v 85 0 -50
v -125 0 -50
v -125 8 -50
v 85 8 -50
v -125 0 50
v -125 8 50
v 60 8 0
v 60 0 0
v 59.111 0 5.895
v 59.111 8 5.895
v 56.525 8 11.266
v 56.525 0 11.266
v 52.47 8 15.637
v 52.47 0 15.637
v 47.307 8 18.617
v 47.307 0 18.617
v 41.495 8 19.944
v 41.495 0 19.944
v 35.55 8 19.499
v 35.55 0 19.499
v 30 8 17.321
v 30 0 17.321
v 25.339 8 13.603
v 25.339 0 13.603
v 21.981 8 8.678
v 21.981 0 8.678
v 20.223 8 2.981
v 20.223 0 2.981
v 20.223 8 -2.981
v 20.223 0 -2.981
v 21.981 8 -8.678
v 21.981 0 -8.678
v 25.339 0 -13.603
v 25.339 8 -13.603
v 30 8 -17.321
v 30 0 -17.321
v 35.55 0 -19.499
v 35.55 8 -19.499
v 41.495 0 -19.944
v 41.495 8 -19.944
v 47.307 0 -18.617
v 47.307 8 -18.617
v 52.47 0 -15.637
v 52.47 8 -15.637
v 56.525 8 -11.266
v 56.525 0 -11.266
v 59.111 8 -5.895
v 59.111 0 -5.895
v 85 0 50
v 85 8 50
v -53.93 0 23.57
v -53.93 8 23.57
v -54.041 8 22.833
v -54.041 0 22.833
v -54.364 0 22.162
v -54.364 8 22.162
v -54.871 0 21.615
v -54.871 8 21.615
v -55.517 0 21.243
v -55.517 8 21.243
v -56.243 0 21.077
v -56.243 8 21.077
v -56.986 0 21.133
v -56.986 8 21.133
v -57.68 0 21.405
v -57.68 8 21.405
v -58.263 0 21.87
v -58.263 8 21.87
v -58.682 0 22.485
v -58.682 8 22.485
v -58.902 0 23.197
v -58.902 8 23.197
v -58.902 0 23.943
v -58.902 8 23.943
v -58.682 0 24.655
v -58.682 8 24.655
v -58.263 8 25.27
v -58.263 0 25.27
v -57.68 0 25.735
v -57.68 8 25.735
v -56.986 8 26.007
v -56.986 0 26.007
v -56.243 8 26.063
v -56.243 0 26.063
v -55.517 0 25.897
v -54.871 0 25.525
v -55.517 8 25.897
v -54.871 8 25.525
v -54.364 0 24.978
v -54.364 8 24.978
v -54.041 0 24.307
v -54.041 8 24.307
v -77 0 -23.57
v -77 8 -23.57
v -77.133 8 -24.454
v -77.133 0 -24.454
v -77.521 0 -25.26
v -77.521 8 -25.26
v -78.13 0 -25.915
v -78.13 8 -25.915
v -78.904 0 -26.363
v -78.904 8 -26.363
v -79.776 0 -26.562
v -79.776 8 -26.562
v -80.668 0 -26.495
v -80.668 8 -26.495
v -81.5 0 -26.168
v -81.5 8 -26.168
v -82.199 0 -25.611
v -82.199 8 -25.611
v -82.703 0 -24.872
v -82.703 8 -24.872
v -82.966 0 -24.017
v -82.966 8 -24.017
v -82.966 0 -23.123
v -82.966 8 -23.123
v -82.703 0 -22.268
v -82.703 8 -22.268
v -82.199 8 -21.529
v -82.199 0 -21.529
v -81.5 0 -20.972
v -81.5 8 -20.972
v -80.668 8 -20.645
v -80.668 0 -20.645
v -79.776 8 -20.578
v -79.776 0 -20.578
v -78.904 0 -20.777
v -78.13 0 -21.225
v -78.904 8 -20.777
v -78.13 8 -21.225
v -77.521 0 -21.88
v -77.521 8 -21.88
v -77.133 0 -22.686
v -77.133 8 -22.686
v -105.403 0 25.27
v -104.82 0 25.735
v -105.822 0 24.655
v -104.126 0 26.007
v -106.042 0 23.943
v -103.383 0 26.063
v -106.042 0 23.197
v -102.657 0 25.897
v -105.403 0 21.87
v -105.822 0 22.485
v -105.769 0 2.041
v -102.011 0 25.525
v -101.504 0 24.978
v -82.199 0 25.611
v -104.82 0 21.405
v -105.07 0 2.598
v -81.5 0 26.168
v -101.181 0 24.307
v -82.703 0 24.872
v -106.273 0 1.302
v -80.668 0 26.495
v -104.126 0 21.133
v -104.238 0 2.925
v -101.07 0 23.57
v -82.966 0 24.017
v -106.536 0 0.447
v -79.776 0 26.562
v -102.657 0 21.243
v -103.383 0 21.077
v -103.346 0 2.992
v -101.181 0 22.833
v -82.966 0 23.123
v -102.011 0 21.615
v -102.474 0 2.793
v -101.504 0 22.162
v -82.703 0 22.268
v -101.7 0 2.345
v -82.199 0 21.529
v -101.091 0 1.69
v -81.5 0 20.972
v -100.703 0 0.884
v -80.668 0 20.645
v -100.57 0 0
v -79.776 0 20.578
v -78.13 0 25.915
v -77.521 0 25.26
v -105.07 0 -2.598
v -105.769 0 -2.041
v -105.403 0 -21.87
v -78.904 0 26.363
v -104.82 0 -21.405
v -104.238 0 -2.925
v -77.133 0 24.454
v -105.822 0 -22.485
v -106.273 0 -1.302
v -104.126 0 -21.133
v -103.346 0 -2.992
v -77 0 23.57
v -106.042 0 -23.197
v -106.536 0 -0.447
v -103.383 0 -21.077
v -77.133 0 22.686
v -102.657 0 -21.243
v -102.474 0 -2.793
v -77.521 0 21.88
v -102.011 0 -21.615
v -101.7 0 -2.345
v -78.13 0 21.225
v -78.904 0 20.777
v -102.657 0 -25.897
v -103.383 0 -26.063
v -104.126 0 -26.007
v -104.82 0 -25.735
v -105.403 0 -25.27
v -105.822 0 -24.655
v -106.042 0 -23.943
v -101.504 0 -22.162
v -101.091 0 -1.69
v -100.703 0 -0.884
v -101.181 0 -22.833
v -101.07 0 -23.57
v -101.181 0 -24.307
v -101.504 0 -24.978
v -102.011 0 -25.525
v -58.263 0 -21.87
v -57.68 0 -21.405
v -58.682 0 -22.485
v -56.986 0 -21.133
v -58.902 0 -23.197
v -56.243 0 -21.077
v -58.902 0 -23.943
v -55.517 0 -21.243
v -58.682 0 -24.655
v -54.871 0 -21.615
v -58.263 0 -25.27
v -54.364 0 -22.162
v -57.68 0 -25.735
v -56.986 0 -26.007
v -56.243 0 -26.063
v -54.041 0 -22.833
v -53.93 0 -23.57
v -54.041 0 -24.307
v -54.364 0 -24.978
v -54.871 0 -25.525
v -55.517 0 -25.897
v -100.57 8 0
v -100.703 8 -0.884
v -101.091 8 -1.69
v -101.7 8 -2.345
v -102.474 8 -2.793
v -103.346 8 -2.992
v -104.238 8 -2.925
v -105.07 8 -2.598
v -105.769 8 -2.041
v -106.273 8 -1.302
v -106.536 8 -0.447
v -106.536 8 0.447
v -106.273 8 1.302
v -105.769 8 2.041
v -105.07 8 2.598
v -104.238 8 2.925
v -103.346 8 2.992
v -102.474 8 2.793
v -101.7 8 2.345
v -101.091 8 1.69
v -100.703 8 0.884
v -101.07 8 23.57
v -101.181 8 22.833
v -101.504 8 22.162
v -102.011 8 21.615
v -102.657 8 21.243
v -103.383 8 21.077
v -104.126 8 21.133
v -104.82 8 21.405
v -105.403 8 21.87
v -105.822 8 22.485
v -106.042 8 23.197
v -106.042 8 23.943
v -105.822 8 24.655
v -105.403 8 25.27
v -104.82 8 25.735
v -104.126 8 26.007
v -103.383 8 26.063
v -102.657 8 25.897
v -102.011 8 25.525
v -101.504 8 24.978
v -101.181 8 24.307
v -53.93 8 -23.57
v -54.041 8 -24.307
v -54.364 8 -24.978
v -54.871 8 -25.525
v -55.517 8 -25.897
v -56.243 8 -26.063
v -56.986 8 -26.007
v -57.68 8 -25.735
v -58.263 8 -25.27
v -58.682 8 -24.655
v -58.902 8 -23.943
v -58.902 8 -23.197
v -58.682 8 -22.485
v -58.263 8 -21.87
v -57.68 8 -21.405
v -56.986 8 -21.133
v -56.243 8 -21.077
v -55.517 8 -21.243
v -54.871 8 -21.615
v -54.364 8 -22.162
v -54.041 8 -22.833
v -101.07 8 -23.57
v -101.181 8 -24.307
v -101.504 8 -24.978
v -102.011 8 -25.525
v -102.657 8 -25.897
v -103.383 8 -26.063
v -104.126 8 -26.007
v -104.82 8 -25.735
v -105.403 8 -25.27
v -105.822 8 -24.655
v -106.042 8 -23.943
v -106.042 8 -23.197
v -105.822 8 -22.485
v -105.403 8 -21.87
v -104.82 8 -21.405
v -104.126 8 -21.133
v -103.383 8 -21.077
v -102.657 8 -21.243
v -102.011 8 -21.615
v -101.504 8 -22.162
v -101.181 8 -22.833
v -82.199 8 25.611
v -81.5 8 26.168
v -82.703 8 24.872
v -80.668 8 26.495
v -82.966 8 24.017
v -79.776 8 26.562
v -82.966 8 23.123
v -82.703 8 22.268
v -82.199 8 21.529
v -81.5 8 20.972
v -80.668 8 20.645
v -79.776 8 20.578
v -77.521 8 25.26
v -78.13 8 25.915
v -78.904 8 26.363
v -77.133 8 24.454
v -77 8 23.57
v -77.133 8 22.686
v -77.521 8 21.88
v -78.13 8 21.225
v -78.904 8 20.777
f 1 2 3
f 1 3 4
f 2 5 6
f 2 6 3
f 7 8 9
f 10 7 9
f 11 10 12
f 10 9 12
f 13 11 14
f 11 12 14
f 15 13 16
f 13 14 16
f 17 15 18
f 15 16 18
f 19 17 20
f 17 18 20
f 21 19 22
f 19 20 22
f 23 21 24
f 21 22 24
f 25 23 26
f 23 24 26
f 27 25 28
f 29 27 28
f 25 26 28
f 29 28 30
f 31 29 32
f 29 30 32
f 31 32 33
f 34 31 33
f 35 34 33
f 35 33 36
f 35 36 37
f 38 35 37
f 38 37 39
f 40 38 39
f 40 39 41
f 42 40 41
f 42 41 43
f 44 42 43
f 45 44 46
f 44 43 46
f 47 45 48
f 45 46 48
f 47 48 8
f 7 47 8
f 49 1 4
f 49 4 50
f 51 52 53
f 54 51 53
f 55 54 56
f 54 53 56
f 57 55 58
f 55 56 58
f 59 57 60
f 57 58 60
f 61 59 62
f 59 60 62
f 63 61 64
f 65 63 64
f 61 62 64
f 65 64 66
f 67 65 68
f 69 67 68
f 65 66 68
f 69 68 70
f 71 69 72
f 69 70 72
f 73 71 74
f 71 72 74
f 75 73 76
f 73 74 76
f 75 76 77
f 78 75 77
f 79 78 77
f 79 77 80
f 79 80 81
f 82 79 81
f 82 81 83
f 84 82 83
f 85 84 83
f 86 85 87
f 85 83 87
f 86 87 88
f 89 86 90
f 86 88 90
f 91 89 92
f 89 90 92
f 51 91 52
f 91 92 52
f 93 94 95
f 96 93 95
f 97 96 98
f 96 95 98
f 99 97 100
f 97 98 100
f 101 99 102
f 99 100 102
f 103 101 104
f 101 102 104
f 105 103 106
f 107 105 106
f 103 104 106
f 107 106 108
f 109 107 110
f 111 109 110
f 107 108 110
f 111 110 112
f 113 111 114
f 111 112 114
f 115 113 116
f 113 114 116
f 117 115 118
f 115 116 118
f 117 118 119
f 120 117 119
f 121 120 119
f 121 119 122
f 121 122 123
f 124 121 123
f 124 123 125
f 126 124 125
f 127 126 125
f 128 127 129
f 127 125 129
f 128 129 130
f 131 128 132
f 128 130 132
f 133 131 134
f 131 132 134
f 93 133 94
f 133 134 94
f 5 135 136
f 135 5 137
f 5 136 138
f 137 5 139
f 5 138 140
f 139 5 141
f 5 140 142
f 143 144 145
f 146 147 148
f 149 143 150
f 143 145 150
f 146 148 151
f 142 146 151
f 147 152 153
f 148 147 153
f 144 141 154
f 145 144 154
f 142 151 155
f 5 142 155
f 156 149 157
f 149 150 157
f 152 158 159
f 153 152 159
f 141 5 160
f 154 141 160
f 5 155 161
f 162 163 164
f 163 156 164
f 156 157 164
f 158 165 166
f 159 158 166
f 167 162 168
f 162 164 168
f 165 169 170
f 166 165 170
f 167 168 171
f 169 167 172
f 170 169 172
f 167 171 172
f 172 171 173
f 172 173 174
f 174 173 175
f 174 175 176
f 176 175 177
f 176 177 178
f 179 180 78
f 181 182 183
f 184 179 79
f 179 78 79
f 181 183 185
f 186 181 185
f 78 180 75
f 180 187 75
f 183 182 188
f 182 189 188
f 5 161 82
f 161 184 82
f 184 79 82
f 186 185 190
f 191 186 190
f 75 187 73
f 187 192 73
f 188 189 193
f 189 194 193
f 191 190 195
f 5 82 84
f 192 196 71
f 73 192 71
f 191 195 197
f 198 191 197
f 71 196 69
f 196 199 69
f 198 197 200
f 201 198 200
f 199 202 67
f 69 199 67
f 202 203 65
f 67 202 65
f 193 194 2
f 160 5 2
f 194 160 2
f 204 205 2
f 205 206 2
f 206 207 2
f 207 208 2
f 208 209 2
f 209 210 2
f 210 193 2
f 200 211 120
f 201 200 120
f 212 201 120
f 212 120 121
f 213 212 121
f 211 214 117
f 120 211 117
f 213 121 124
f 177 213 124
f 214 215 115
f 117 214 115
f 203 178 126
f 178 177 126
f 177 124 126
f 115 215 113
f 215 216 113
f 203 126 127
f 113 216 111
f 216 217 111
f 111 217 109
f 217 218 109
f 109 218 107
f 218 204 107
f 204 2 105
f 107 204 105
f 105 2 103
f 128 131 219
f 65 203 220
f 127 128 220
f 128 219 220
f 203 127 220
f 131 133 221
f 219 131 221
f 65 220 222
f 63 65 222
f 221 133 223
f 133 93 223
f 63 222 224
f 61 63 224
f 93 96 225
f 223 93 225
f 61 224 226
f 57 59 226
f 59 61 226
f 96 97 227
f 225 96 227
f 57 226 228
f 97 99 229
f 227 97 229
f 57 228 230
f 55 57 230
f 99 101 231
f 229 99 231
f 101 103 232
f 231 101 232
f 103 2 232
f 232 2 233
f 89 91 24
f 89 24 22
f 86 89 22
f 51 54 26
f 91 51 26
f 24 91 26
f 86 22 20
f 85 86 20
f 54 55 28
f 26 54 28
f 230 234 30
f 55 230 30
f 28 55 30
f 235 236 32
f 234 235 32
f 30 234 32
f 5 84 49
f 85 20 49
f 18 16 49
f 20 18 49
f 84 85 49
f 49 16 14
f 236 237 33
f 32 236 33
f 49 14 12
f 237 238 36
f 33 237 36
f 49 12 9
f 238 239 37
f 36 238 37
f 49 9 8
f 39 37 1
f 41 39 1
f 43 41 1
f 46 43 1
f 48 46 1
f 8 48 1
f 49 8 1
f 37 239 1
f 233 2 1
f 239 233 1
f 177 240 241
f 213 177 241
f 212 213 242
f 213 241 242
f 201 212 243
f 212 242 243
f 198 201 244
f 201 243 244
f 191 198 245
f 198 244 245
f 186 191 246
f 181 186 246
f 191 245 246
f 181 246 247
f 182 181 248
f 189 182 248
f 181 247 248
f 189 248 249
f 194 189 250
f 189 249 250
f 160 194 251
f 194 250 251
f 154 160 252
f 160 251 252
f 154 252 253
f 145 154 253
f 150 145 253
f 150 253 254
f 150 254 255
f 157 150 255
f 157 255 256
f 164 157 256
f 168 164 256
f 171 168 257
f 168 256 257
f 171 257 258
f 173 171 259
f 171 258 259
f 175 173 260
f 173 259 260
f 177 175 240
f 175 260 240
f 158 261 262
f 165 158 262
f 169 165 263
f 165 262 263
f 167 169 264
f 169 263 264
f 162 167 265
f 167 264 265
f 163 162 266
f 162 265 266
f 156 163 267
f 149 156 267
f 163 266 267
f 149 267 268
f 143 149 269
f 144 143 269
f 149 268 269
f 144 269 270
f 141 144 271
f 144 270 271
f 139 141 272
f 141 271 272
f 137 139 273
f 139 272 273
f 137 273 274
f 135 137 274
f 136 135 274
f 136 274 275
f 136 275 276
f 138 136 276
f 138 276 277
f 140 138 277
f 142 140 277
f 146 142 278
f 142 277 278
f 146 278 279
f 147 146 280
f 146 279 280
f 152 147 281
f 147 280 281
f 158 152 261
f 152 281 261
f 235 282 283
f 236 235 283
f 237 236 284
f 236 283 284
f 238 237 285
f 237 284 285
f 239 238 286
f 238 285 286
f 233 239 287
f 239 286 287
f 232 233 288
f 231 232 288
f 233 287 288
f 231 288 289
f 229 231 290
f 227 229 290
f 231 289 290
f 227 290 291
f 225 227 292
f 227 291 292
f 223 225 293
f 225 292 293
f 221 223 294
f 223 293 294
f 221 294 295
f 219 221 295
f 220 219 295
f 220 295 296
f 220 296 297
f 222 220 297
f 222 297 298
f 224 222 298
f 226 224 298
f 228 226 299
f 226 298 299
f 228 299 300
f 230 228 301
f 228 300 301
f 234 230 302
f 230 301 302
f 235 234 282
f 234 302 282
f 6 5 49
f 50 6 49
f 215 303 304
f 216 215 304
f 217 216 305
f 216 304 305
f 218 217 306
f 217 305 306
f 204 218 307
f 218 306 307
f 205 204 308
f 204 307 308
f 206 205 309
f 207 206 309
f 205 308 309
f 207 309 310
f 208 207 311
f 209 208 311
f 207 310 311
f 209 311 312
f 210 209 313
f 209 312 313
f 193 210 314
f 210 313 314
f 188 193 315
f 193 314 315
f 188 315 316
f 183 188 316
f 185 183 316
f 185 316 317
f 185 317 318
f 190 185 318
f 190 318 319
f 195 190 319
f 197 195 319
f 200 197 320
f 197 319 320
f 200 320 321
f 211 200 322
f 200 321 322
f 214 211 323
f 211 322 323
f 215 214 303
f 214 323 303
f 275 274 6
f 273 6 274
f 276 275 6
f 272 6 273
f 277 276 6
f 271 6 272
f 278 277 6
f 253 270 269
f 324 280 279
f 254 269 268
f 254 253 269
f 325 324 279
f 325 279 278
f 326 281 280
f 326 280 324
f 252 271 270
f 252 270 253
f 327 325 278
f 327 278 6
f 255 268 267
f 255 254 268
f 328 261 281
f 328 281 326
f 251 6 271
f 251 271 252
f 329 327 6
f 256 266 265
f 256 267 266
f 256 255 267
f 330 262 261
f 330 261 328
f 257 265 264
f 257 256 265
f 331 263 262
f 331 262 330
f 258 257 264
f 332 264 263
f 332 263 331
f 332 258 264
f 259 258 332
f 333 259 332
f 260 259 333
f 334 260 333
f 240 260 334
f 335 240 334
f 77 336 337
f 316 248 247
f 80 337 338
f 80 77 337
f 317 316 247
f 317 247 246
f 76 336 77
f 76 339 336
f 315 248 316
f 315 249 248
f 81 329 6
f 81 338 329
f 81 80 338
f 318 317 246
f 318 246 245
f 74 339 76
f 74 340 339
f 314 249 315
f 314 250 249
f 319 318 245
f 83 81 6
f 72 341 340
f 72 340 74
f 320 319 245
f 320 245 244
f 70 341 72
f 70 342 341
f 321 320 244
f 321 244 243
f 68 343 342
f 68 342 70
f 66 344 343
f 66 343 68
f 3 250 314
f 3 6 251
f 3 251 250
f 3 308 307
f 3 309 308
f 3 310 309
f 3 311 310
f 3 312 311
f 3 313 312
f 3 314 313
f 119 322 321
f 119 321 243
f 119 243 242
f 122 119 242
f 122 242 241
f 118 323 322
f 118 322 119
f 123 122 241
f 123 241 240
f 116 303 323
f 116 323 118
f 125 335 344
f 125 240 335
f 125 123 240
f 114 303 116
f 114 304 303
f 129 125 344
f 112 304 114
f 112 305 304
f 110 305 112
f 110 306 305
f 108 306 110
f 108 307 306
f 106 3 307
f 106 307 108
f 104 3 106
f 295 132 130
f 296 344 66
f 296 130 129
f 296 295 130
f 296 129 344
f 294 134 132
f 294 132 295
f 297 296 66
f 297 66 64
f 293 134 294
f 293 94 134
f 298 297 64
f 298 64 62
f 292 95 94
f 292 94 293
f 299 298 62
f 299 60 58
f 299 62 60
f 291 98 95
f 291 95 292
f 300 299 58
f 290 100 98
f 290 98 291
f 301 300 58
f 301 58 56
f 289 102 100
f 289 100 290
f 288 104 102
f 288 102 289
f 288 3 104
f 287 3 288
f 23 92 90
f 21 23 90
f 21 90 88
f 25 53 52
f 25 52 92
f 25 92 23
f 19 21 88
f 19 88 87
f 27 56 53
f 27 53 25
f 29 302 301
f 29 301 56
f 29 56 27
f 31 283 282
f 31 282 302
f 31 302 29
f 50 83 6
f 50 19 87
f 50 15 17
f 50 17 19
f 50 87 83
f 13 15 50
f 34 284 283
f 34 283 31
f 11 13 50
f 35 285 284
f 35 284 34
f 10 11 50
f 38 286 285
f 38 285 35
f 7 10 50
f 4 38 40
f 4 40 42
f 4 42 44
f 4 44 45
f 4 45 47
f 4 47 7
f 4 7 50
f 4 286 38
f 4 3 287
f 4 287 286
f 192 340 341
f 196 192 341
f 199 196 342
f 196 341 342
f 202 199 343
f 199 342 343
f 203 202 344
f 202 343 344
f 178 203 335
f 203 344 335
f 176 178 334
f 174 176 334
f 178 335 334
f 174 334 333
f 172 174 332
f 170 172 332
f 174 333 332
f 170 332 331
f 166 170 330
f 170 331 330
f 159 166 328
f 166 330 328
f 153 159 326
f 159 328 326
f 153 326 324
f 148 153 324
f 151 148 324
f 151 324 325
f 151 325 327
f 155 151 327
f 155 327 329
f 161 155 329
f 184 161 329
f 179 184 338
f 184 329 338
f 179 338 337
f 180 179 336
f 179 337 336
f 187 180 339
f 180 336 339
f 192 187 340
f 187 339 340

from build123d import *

# Parameters (mm, degrees)
SKETCH1_W           = 250
SKETCH1_H           = 100
BOSS_EXTRUDE1_DEPTH = 8
SKETCH2_R           = 2.5
CUT_EXTRUDE1_DEPTH  = 8
SKETCH3_R           = 3
CUT_EXTRUDE2_DEPTH  = 8
SKETCH5_W           = 40
SKETCH5_H           = 100
CUT_EXTRUDE3_DEPTH  = 10
SKETCH6_R           = 20
CUT_EXTRUDE4_DEPTH  = 8


with BuildPart() as part:
    # Sketch1 → Boss-Extrude1 (new body)
    with BuildSketch(Plane(origin=(0, 0, 0), x_dir=(1, 0, 0), z_dir=(0, 1, 0))):
        Rectangle(SKETCH1_W, SKETCH1_H)
    extrude(amount=BOSS_EXTRUDE1_DEPTH)

    # Sketch2 → Cut-Extrude1 (cut)
    with BuildSketch(Plane(origin=(0, 8, 0), x_dir=(1, 0, 0), z_dir=(0, 1, 0))):
        with Locations((-103.57, 23.57)):
            Circle(SKETCH2_R)
        with Locations((-56.43, 23.57)):
            Circle(SKETCH2_R)
        with Locations((-56.43, -23.57)):
            Circle(SKETCH2_R)
        with Locations((-103.57, -23.57)):
            Circle(SKETCH2_R)
    extrude(amount=-CUT_EXTRUDE1_DEPTH, mode=Mode.SUBTRACT)

    # Sketch3 → Cut-Extrude2 (cut)
    with BuildSketch(Plane(origin=(0, 8, 0), x_dir=(1, 0, 0), z_dir=(0, 1, 0))):
        with Locations((-80, 23.57)):
            Circle(SKETCH3_R)
        with Locations((-103.57, 0)):
            Circle(SKETCH3_R)
        with Locations((-80, -23.57)):
            Circle(SKETCH3_R)
    extrude(amount=-CUT_EXTRUDE2_DEPTH, mode=Mode.SUBTRACT)

    # Sketch5 → Cut-Extrude3 (cut)
    with BuildSketch(Plane.XZ):
        with Locations((105, 0)):
            Rectangle(SKETCH5_W, SKETCH5_H)
    extrude(amount=-CUT_EXTRUDE3_DEPTH, mode=Mode.SUBTRACT)

    # Sketch6 → Cut-Extrude4 (cut)
    with BuildSketch(Plane.XZ):
        with Locations((40, 0)):
            Circle(SKETCH6_R)
    extrude(amount=-CUT_EXTRUDE4_DEPTH, mode=Mode.SUBTRACT)


solid = part.part
